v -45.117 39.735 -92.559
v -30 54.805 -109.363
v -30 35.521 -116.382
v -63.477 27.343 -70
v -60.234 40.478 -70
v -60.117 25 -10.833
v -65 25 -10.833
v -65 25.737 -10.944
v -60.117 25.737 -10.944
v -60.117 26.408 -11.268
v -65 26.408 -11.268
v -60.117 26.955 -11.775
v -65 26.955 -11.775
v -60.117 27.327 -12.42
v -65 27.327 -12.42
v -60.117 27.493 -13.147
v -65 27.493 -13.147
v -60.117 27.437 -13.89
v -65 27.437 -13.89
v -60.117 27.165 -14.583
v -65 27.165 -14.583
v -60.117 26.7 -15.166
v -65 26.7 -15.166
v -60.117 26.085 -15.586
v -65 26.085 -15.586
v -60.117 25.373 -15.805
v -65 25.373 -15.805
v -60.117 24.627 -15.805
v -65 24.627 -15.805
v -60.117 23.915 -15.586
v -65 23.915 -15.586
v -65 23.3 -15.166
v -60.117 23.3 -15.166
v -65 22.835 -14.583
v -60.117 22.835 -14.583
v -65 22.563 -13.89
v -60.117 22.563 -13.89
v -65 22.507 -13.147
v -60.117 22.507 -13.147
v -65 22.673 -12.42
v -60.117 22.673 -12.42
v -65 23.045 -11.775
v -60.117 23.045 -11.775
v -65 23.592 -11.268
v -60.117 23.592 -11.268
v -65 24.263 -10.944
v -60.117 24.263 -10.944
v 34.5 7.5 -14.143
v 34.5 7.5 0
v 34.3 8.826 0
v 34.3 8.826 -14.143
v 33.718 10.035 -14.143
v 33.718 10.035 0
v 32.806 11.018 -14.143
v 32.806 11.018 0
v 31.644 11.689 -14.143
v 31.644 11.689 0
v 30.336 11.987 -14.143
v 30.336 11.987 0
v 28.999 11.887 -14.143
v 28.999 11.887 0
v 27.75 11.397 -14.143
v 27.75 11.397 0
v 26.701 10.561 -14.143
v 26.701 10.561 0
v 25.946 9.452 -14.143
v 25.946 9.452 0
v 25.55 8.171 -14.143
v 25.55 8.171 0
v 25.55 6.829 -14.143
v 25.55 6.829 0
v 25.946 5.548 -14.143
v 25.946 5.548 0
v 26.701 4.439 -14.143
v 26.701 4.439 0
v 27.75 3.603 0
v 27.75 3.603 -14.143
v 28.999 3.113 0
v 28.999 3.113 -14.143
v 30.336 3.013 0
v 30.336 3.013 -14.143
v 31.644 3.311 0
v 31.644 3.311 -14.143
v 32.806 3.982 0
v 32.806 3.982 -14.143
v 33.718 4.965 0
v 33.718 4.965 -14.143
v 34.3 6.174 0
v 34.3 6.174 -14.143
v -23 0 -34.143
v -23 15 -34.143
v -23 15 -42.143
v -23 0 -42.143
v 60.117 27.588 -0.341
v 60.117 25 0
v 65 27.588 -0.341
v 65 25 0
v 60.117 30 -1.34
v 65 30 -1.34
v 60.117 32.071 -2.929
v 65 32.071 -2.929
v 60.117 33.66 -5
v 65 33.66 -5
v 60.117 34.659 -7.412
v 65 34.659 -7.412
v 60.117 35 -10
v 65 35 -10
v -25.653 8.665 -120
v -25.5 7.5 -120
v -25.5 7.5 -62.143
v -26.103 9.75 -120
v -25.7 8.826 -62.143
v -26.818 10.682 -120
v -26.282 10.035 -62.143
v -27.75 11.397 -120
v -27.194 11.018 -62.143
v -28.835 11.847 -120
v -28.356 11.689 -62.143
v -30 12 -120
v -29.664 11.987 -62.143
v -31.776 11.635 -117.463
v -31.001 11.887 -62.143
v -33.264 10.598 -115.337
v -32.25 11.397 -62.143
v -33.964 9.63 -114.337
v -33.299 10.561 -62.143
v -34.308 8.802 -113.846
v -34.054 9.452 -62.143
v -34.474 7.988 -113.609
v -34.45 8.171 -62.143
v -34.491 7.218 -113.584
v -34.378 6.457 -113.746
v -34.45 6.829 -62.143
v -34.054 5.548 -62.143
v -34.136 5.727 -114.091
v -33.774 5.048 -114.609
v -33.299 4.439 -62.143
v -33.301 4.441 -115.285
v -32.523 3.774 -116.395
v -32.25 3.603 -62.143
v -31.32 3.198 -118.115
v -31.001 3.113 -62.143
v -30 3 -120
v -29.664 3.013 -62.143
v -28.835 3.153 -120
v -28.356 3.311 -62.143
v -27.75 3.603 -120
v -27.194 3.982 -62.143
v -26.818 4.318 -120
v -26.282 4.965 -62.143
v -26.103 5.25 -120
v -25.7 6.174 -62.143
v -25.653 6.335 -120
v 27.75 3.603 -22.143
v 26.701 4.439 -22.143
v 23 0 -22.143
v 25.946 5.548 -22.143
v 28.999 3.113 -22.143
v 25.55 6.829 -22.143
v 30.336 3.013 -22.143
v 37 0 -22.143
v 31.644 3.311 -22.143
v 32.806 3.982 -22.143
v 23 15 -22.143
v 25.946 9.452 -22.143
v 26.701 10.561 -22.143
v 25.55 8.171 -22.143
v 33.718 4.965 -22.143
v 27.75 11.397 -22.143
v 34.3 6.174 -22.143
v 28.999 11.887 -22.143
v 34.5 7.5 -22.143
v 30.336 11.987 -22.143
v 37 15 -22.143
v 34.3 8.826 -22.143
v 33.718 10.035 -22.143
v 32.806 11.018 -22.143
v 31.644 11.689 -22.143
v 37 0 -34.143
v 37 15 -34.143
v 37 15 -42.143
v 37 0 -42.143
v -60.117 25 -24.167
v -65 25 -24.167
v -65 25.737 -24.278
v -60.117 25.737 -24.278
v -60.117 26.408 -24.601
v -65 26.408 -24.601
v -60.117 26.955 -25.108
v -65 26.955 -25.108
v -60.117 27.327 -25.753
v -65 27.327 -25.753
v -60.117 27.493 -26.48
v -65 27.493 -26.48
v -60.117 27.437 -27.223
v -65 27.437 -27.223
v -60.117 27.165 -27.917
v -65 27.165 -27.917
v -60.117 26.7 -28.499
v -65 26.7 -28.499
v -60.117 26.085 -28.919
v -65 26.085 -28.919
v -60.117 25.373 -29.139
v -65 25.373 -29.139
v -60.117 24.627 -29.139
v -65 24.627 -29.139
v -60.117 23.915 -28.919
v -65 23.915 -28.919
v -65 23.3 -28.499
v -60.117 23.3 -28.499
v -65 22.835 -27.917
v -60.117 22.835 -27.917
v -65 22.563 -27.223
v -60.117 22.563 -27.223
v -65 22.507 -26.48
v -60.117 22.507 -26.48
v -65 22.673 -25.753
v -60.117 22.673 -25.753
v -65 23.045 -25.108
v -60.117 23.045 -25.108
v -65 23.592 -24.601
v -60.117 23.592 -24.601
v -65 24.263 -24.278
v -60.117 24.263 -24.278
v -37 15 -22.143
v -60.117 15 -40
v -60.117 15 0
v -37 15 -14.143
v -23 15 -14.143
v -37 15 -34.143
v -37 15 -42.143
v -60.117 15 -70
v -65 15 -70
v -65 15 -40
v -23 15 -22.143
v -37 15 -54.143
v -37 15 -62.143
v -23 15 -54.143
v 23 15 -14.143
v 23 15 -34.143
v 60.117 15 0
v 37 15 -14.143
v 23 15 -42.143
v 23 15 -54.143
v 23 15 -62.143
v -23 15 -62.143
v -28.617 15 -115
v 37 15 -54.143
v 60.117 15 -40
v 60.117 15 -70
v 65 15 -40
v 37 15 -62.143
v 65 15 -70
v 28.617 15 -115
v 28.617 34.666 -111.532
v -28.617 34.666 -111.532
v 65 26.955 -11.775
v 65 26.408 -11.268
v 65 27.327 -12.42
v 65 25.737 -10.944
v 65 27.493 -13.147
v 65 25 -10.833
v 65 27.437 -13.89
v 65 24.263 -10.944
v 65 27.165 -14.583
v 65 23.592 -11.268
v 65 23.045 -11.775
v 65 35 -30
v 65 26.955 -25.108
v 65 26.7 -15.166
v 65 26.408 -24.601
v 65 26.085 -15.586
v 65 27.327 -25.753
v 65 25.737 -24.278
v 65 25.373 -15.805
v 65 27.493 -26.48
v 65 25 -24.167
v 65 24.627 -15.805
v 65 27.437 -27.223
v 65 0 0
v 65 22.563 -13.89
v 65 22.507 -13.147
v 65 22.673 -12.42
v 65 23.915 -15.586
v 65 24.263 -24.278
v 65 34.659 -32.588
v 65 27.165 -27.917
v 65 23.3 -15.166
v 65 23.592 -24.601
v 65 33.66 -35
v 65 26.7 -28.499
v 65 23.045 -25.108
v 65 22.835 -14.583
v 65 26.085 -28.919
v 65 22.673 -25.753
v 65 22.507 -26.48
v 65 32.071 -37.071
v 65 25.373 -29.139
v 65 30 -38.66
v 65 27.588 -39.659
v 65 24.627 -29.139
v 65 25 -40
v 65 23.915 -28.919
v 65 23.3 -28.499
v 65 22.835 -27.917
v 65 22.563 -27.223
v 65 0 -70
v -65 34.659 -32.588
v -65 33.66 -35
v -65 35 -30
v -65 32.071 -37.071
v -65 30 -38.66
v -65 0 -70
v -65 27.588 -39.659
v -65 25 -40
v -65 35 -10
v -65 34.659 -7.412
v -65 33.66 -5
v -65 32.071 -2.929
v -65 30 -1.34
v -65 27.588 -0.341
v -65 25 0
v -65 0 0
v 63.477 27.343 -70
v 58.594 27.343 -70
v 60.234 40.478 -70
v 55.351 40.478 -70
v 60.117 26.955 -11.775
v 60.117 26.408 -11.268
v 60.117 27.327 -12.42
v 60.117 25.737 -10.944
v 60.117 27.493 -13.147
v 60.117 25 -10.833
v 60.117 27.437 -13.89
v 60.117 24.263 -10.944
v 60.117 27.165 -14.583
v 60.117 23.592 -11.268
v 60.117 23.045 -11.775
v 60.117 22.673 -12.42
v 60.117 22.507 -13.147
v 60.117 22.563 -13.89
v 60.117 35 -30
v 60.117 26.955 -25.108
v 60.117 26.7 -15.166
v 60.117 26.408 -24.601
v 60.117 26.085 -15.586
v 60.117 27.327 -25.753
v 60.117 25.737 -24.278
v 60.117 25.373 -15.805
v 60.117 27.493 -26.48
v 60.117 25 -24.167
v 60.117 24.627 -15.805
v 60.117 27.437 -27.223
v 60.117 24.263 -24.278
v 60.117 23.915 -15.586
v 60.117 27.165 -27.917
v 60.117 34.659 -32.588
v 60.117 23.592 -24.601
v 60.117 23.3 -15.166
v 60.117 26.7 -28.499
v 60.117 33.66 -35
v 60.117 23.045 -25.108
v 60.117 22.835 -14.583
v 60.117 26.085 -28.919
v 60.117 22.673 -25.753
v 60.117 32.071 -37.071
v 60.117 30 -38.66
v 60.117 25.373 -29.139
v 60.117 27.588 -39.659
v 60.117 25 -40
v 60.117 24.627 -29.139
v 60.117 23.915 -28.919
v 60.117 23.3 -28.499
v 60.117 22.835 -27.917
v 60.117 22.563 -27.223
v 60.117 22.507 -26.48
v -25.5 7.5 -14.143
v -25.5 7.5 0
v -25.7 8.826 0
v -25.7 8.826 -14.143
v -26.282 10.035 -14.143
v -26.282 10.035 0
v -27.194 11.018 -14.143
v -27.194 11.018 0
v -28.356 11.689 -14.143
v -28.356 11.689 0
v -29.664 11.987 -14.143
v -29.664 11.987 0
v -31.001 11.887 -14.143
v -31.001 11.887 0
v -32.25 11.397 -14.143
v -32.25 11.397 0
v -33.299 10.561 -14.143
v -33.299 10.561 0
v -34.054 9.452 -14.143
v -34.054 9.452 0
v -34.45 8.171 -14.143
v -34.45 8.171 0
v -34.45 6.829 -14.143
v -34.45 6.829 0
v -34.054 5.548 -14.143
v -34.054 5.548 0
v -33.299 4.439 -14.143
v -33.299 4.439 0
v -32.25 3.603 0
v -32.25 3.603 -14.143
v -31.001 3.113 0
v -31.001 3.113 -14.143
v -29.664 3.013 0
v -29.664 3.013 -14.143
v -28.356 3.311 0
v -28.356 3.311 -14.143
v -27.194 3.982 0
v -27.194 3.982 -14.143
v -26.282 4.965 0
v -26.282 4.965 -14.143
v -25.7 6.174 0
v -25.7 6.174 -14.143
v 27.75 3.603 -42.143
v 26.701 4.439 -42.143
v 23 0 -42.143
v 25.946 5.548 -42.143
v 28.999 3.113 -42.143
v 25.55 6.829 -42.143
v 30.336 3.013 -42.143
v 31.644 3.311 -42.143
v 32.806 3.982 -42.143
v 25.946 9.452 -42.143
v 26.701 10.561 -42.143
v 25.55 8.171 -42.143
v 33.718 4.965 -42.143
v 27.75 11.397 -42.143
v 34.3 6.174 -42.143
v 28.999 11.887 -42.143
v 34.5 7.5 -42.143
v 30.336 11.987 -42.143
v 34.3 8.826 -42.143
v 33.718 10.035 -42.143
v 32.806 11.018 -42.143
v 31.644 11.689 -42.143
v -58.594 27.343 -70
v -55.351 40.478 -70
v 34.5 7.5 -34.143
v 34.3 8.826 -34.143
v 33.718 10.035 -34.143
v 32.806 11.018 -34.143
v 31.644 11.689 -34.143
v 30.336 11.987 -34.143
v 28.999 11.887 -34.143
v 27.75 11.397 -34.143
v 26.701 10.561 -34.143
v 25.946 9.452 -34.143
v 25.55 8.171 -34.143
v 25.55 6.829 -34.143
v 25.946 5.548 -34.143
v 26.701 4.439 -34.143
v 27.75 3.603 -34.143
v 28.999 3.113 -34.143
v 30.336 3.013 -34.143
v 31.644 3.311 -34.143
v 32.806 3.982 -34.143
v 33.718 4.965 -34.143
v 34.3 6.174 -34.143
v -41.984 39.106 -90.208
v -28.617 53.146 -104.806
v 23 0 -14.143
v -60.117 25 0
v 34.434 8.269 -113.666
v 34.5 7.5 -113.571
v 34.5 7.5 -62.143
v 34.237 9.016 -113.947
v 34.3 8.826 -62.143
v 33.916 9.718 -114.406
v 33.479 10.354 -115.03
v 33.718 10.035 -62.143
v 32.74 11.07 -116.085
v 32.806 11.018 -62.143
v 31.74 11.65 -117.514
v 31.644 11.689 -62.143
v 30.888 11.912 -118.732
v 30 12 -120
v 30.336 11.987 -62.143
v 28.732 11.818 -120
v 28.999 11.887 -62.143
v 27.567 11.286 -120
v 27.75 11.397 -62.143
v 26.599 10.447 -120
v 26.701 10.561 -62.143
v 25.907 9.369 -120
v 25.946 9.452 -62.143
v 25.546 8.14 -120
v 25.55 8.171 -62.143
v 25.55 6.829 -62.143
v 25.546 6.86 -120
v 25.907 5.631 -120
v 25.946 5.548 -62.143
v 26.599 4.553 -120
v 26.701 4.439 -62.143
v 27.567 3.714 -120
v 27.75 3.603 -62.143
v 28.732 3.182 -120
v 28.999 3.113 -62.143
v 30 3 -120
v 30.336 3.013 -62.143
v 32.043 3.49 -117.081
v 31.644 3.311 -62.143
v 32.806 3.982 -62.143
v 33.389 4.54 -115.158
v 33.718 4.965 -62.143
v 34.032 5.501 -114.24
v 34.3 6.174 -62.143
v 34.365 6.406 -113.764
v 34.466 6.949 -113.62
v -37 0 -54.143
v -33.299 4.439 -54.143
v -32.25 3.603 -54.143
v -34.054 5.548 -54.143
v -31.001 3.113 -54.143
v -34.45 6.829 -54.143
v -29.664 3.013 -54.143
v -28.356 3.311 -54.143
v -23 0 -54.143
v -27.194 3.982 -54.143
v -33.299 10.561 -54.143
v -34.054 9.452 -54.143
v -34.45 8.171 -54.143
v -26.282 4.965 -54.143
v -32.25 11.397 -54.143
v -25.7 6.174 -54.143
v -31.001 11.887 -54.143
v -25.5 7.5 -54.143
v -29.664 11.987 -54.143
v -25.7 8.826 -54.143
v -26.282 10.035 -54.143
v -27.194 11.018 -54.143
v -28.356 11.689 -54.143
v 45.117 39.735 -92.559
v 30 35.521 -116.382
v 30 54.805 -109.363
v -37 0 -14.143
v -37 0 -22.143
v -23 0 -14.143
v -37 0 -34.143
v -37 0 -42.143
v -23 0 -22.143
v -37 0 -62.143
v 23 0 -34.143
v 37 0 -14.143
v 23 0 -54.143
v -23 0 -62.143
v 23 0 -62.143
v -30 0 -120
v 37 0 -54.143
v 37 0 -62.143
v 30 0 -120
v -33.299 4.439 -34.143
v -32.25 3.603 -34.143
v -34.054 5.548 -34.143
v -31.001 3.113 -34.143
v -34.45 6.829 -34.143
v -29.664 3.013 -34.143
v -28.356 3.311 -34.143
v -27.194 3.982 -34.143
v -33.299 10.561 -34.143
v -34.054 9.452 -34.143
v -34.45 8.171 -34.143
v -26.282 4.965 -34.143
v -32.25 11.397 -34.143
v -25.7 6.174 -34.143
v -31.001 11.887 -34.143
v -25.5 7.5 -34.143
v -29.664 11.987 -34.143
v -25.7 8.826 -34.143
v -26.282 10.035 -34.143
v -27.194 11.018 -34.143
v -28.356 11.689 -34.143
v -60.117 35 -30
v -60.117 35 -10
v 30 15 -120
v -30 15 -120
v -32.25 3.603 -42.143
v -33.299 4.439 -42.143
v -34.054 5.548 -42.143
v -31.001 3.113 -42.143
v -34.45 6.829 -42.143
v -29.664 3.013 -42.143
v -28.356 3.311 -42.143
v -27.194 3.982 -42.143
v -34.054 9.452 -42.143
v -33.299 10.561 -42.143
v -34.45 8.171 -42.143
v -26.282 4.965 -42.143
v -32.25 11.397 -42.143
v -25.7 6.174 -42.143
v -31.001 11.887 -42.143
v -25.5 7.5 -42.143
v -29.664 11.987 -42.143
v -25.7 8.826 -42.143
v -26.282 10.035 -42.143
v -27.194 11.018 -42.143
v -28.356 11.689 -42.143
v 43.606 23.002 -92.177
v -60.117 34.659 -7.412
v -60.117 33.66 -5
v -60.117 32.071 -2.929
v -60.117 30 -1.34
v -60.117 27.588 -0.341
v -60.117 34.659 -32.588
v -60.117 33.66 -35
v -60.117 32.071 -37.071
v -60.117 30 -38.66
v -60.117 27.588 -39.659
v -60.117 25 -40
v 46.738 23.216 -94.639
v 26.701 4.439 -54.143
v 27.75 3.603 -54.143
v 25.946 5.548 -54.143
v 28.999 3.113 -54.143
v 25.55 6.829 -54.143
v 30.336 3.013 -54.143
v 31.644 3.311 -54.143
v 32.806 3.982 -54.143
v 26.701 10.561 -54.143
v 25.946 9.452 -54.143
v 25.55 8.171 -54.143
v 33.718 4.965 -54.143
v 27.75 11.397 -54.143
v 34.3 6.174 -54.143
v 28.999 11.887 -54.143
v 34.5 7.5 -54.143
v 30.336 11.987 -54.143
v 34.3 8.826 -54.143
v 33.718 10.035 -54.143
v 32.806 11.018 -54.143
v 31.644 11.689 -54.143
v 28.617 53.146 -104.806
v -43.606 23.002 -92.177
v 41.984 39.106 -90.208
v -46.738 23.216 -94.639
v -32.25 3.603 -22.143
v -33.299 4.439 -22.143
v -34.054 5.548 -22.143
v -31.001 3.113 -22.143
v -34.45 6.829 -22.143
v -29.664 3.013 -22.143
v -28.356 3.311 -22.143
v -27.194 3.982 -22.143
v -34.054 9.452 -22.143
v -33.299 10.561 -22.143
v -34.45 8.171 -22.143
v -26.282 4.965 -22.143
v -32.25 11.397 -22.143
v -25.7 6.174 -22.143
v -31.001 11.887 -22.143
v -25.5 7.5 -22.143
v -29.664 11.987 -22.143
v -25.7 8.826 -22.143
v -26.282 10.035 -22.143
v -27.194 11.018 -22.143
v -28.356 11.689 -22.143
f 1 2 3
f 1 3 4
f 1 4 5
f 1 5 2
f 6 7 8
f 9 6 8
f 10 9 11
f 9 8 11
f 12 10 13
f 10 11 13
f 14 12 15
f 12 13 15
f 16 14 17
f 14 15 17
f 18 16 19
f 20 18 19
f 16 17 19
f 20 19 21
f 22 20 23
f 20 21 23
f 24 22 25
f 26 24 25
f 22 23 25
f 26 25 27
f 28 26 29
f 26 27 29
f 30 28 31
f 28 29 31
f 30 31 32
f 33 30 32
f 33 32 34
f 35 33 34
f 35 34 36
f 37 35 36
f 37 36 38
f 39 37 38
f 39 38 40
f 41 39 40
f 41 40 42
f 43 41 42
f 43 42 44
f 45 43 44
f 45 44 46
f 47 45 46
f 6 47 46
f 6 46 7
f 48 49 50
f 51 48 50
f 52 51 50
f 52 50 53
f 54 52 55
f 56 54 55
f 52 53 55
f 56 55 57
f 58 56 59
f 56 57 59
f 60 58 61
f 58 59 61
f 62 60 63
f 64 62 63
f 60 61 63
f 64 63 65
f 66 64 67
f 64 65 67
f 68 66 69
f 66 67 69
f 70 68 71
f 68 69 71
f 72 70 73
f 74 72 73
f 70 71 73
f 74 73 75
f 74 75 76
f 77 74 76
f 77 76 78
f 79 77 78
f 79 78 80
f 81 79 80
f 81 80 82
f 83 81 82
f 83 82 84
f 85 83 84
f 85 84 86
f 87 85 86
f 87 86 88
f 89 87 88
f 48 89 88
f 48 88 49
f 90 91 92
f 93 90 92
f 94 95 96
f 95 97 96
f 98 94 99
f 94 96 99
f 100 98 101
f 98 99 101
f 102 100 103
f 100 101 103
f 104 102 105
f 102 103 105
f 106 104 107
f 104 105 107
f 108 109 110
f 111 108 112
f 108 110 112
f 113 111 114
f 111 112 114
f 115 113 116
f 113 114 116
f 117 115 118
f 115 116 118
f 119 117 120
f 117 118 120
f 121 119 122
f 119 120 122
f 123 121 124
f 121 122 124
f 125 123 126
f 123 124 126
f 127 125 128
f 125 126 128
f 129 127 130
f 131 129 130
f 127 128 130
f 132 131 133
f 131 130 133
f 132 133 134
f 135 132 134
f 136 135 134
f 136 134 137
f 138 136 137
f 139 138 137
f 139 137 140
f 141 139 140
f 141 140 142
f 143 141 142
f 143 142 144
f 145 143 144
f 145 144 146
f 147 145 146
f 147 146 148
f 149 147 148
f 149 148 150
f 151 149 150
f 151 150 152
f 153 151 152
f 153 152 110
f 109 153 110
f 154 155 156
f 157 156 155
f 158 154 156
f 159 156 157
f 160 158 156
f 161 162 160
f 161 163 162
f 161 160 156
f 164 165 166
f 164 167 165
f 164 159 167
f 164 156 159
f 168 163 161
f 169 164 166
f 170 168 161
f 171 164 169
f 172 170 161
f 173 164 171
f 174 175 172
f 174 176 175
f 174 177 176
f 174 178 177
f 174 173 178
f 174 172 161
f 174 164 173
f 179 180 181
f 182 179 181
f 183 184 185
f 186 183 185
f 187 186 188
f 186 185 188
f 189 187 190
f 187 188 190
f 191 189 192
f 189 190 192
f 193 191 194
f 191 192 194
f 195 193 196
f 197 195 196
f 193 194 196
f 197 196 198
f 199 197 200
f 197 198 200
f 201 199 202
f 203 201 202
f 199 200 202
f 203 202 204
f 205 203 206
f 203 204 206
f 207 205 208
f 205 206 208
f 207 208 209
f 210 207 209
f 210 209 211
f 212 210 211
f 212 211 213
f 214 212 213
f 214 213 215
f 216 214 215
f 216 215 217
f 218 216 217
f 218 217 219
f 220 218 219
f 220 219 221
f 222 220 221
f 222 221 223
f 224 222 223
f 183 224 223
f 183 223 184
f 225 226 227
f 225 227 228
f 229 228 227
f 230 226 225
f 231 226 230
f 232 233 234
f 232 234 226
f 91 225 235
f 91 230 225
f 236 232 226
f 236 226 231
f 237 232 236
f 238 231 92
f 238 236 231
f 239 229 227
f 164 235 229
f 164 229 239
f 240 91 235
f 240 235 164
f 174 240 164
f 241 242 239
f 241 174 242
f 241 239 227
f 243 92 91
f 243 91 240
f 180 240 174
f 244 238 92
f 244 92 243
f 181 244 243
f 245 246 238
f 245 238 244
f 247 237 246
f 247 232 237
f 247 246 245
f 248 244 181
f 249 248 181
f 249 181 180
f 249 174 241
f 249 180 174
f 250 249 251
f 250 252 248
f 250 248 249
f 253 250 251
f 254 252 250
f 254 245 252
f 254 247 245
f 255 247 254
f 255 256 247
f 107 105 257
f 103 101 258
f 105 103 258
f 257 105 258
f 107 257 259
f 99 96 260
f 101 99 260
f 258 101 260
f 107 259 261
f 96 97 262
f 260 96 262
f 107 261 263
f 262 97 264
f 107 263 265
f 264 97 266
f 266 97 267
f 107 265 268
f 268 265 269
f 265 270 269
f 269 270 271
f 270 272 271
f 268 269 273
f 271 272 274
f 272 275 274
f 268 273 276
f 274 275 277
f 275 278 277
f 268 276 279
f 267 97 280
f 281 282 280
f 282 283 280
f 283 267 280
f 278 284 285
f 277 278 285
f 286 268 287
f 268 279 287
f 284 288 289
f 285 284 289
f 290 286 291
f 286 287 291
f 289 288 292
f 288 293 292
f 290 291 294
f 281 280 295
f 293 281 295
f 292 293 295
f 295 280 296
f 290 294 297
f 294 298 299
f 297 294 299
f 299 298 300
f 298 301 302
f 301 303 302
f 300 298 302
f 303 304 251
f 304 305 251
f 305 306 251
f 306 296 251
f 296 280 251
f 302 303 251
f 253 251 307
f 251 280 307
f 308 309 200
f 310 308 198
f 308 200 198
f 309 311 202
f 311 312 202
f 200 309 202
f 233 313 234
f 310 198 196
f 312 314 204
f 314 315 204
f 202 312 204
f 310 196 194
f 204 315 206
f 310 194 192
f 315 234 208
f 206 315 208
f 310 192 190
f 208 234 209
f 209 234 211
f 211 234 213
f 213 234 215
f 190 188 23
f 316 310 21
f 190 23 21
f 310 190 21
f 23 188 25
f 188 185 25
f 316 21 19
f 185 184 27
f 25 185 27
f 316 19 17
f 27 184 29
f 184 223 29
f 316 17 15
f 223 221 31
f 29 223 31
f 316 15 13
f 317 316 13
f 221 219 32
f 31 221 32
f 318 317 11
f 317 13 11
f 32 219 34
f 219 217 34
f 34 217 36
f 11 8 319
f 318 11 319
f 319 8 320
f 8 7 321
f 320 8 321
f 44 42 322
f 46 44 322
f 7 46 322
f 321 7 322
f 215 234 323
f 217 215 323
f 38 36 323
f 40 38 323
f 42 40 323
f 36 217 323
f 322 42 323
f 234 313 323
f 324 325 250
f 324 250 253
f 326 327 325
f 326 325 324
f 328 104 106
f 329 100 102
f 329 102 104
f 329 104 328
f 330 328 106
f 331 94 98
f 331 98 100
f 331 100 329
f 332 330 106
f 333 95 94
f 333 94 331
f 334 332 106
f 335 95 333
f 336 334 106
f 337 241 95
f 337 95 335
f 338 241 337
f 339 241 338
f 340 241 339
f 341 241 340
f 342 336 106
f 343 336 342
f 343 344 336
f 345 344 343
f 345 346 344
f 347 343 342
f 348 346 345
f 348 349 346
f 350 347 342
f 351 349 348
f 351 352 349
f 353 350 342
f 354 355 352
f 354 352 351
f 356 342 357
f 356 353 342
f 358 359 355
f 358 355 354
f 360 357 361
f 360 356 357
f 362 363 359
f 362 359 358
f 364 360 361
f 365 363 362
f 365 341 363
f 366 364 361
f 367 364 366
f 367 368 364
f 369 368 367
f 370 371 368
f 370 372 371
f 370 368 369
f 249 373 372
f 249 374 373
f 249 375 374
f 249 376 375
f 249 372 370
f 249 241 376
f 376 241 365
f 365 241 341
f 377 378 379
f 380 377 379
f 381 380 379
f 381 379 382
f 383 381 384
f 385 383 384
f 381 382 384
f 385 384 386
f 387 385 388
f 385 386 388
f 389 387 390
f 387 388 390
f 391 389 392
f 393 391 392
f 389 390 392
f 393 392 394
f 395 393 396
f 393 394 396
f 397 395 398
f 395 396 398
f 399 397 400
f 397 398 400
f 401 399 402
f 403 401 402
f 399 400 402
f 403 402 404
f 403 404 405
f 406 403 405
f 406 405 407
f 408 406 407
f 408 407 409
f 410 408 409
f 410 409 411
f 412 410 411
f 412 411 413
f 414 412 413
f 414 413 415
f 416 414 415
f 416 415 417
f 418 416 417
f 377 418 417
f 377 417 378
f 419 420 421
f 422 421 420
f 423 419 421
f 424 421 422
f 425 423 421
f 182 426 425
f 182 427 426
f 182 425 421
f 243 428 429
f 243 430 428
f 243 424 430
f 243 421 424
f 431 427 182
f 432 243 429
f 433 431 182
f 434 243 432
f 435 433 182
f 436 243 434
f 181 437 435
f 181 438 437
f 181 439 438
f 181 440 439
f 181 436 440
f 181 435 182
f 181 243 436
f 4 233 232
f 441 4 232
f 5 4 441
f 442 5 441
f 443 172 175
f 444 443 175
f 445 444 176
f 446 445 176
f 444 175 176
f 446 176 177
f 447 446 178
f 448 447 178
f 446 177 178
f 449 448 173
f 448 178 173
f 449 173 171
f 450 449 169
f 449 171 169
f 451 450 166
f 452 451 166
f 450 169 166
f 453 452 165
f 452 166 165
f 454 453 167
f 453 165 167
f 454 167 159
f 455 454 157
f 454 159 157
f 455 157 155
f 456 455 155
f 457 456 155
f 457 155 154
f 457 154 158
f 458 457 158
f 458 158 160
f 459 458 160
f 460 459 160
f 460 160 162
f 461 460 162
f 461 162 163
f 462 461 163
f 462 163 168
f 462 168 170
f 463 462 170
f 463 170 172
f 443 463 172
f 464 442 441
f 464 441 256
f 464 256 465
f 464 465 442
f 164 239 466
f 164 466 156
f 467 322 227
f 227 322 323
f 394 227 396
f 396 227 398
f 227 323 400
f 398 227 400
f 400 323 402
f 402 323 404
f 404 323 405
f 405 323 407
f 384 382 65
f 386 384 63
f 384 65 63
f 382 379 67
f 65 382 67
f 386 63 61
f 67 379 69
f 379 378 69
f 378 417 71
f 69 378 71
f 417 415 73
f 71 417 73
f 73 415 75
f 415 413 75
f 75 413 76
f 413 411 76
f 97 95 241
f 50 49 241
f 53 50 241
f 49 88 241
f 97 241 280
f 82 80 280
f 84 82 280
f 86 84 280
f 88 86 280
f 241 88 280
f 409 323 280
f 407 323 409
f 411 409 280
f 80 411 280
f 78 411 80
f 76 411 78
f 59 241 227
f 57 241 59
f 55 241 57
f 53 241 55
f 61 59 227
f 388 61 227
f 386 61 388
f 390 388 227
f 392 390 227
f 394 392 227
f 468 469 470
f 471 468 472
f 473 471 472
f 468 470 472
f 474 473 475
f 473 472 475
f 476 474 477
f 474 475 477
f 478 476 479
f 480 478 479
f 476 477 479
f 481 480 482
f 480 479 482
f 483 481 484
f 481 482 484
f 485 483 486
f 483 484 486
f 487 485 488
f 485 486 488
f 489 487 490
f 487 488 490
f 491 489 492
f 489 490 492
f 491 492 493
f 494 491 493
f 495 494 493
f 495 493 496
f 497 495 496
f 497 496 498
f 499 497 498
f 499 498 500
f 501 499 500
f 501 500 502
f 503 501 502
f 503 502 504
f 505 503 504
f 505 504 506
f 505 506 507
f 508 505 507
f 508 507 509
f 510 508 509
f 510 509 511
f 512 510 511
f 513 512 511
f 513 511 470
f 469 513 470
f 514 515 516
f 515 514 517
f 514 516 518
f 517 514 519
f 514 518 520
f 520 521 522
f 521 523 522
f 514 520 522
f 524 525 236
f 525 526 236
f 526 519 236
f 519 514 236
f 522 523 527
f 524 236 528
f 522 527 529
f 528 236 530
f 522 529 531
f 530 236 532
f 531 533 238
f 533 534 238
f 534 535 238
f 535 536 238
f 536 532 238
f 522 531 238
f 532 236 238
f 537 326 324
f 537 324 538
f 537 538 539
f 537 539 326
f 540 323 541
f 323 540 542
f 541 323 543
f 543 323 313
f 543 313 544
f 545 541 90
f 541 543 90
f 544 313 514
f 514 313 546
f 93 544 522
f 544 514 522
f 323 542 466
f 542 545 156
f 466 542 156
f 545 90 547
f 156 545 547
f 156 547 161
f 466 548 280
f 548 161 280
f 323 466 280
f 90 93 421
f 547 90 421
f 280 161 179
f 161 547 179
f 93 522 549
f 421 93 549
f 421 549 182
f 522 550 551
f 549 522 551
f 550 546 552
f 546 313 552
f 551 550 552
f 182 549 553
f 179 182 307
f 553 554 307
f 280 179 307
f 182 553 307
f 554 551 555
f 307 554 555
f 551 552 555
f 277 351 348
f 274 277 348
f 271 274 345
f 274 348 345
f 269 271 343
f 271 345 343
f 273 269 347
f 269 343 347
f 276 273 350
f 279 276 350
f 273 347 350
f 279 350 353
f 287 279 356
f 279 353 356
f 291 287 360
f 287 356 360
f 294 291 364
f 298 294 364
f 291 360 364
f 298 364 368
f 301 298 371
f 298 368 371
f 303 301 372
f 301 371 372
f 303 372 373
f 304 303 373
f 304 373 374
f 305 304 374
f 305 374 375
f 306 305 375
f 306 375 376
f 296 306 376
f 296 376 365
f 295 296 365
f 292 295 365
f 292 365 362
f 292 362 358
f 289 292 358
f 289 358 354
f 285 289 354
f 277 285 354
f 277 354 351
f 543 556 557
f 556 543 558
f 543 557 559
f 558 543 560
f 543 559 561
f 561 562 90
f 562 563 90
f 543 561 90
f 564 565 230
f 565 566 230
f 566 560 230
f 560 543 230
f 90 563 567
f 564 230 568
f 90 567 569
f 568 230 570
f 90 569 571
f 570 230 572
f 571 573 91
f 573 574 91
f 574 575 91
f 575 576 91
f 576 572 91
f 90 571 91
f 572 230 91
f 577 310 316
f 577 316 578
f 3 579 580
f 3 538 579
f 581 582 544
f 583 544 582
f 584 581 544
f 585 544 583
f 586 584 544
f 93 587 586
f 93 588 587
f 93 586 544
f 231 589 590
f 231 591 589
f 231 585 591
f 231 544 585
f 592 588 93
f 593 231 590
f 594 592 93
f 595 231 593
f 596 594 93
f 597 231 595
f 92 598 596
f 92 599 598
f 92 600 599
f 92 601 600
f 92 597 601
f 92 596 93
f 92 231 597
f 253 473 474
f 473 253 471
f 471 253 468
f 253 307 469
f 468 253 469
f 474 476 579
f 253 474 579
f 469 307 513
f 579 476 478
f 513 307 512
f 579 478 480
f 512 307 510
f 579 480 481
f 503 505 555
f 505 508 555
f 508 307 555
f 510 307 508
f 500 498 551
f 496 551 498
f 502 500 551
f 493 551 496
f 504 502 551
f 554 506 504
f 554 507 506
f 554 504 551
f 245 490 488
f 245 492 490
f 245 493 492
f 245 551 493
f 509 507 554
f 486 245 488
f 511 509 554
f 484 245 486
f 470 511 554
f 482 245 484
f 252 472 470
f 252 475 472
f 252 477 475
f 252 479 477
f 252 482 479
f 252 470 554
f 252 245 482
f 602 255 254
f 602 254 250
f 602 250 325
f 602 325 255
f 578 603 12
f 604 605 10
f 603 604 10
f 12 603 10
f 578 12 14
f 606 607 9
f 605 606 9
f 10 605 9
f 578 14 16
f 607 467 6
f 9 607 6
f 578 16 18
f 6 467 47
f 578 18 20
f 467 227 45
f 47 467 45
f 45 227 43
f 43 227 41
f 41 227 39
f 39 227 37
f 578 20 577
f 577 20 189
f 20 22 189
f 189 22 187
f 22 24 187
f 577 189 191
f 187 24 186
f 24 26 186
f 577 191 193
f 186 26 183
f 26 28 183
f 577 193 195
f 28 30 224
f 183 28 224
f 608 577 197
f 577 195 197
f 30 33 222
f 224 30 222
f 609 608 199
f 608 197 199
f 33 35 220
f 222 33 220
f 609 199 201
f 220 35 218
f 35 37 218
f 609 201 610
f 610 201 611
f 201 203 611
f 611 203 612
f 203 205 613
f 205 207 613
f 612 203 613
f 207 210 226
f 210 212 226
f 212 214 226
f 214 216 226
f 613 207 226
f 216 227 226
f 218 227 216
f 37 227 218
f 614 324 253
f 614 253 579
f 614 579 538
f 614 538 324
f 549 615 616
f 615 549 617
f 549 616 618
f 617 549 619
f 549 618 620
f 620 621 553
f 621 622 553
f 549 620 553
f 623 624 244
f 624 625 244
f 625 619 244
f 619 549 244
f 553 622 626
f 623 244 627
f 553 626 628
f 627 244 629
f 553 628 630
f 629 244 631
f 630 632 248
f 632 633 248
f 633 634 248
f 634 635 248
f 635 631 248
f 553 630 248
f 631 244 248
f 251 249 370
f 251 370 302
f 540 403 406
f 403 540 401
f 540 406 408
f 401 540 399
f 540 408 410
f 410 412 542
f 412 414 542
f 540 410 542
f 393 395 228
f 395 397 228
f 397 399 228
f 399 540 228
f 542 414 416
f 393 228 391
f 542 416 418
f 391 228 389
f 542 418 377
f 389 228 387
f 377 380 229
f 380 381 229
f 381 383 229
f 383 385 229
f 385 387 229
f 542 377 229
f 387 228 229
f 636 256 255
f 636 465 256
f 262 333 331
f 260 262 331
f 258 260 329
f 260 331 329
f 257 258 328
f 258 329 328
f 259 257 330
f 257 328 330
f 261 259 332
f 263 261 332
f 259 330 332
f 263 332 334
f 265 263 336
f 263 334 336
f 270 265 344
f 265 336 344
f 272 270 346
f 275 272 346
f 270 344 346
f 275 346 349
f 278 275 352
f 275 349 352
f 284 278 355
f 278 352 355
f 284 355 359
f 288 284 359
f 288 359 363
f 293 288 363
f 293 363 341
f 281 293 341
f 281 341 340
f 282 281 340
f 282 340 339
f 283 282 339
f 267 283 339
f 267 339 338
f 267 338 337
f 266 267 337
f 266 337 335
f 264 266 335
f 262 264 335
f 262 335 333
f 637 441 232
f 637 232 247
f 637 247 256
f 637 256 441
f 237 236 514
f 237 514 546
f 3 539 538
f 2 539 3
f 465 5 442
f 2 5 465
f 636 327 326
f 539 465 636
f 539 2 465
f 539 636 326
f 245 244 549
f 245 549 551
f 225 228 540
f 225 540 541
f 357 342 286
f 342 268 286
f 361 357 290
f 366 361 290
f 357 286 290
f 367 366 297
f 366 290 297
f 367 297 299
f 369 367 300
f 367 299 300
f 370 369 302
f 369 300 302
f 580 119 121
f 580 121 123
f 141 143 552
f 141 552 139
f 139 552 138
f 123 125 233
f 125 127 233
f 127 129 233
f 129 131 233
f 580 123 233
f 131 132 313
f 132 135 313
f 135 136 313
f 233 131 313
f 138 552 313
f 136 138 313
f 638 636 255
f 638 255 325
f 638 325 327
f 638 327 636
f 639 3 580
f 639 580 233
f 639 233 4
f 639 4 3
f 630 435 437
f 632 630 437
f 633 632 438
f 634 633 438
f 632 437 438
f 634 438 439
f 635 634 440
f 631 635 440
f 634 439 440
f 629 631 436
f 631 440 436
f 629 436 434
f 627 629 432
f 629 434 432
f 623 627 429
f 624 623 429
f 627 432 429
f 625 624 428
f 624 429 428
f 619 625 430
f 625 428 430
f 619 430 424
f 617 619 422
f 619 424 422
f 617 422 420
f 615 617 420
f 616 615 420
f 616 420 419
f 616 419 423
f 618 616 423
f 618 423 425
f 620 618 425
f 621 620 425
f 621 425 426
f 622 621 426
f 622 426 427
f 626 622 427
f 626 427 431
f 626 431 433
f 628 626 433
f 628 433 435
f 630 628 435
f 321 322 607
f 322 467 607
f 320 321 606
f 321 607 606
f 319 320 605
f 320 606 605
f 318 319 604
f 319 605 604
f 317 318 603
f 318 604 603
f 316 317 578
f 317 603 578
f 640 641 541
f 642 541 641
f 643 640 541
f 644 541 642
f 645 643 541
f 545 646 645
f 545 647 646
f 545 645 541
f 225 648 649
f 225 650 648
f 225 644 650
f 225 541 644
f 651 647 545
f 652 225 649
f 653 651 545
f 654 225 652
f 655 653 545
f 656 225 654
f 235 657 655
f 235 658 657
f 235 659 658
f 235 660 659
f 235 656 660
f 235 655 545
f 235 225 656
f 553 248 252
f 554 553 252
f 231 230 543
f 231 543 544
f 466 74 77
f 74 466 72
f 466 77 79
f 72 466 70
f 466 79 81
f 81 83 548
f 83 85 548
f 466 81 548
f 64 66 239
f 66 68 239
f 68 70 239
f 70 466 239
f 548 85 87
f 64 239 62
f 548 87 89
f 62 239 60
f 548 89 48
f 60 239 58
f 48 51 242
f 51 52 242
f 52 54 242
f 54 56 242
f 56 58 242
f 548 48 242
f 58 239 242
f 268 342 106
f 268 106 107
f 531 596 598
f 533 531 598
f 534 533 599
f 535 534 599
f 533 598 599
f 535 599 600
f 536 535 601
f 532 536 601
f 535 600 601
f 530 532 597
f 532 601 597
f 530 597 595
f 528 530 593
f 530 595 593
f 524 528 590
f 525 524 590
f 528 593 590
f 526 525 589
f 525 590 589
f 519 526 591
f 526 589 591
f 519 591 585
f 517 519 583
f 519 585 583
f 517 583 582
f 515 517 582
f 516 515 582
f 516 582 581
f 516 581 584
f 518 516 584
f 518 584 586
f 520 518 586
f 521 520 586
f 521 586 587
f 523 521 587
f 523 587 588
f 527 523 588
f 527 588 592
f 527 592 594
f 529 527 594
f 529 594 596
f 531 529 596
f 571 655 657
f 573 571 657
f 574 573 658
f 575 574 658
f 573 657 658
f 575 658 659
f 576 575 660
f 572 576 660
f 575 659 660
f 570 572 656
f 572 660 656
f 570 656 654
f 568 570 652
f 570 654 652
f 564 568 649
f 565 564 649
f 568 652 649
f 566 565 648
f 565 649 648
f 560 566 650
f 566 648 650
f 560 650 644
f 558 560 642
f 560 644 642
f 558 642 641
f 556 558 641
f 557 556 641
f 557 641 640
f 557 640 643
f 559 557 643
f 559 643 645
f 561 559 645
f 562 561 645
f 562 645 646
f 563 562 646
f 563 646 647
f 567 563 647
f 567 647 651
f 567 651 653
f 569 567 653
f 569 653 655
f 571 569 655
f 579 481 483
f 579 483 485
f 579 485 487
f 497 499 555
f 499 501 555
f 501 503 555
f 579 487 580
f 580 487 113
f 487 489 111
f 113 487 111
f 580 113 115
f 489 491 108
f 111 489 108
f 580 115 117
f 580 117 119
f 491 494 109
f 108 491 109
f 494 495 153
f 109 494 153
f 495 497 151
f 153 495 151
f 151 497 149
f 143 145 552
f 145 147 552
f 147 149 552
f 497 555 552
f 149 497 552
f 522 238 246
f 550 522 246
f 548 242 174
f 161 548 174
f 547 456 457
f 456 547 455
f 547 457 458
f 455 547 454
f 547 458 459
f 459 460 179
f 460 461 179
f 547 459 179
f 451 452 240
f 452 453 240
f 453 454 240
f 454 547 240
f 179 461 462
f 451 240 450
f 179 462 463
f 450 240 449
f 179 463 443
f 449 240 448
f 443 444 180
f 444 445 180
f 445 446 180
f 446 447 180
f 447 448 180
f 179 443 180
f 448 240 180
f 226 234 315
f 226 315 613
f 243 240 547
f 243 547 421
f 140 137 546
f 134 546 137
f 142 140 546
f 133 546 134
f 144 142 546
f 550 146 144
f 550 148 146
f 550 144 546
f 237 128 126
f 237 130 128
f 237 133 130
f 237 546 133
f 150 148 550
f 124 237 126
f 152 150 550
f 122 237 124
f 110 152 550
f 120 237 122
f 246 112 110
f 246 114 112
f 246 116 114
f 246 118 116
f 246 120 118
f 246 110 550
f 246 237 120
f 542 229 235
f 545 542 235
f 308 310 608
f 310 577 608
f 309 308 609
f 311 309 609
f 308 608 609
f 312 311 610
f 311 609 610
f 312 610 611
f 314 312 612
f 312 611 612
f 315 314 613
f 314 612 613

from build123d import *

# Parameters (mm, degrees)
EXTRUDE_1_DEPTH        = 15
SKETCH_4_W             = 130
SKETCH_4_H             = 53.153449772
CUT_EXTRUDE_1_DEPTH    = 70
SKETCH_5_W             = 4.882622246
SKETCH_5_H             = 40
EXTRUDE_2_DEPTH        = 20
SKETCH_6_R             = 2.5
CUT_EXTRUDE_2_DEPTH    = 186.212230178
FILLET_1_R             = 10
SKETCH_7_R             = 4.5
CUT_EXTRUDE_3_DEPTH    = 148.066550223
SKETCH_8_W             = 14
SKETCH_8_H             = 8
CUT_EXTRUDE_4_DEPTH    = 143.159857501
PATTERN_LINEAR_1_COUNT = 3
PATTERN_LINEAR_1_PITCH = 20


with BuildPart() as part:
    # 草图1 → 凸台-拉伸1 (new body)
    with BuildSketch(Plane(origin=(0, 0, 0), x_dir=(1, 0, 0), z_dir=(0, 1, 0))):
        Polygon((-65, 0), (65, 0), (65, 70), (30, 120), (-30, 120), (-65, 70), align=None)
    extrude(amount=EXTRUDE_1_DEPTH)

    # 草图2 → 放样1 section 0
    with BuildSketch(Plane(origin=(0, 15, 0), x_dir=(1, 0, 0), z_dir=(0, 1, 0))):
        with BuildLine():
            Line((-65, 70), (-61.723072318, 67.706150623))
            Line((-61.723072318, 67.706150623), (-28.617377754, 115))
            Line((-28.617377754, 115), (28.617377754, 115))
            Line((28.617377754, 115), (61.723072318, 67.706150623))
            Line((61.723072318, 67.706150623), (65, 70))
            Line((65, 70), (30, 120))
            Line((30, 120), (-30, 120))
            Line((-30, 120), (-65, 70))
        make_face()
    # 草图3 → 放样1 section 1
    with BuildSketch(Plane(origin=(0, 14.547694656, 2.565151075), x_dir=(1, 0, 0), z_dir=(0, 0.984807753012208, 0.17364817766693072))):
        with BuildLine():
            Line((-65, 71.541265376), (-61.723072318, 69.282264725))
            Line((-61.723072318, 69.282264725), (-28.617377754, 115.857614261))
            Line((-28.617377754, 115.857614261), (28.617377754, 115.857614261))
            Line((28.617377754, 115.857614261), (61.723072318, 69.282264725))
            Line((61.723072318, 69.282264725), (65, 71.541265376))
            Line((65, 71.541265376), (30, 120.781653026))
            Line((30, 120.781653026), (-30, 120.781653026))
            Line((-30, 120.781653026), (-65, 71.541265376))
        make_face()
    loft()

    # 草图9 → 放样2 section 0
    with BuildSketch(Plane(origin=(0, 14.547694656, 2.565151075), x_dir=(1, 0, 0), z_dir=(0, 0.9848077530122079, 0.17364817766693139))):
        with BuildLine():
            Line((-65, 71.541265376), (-61.723072318, 69.282264725))
            Line((-61.723072318, 69.282264725), (-28.617377754, 115.857614261))
            Line((-28.617377754, 115.857614261), (28.617377754, 115.857614261))
            Line((28.617377754, 115.857614261), (61.723072318, 69.282264725))
            Line((61.723072318, 69.282264725), (65, 71.541265376))
            Line((65, 71.541265376), (30, 120.781653026))
            Line((30, 120.781653026), (-30, 120.781653026))
            Line((-30, 120.781653026), (-65, 71.541265376))
        make_face()
    # 草图10 → 放样2 section 1
    with BuildSketch(Plane(origin=(0, 13.245333323, 4.820907073), x_dir=(1, 0, 0), z_dir=(0, 0.9396926207859081, 0.34202014332566943))):
        with BuildLine():
            Line((-65, 73.019543877), (-61.723072318, 70.794862522))
            Line((-61.723072318, 70.794862522), (-28.617377754, 116.662627845))
            Line((-28.617377754, 116.662627845), (28.617377754, 116.662627845))
            Line((28.617377754, 116.662627845), (61.723072318, 70.794862522))
            Line((61.723072318, 70.794862522), (65, 73.019543877))
            Line((65, 73.019543877), (30, 121.511859397))
            Line((30, 121.511859397), (-30, 121.511859397))
            Line((-30, 121.511859397), (-65, 73.019543877))
        make_face()
    loft()

    # 草图4 → 切除-拉伸1 (cut)
    with BuildSketch(Plane.XY):
        with Locations((0, 41.576724886)):
            Rectangle(SKETCH_4_W, SKETCH_4_H)
    extrude(amount=-CUT_EXTRUDE_1_DEPTH, mode=Mode.SUBTRACT)

    # 草图5 → 凸台-拉伸2 (add)
    with BuildSketch(Plane(origin=(0, 15, 0), x_dir=(1, 0, 0), z_dir=(0, 1, 0))):
        with Locations((62.558688877, 20)):
            Rectangle(SKETCH_5_W, SKETCH_5_H)
        with Locations((-62.558688877, 20)):
            Rectangle(SKETCH_5_W, SKETCH_5_H)
    extrude(amount=EXTRUDE_2_DEPTH)

    # 草图6 → 切除-拉伸2 (cut, through all)
    with BuildSketch(Plane.ZY.offset(65)):
        with Locations((-26.666666667, 25)):
            Circle(SKETCH_6_R)
        with Locations((-13.333333333, 25)):
            Circle(SKETCH_6_R)
    extrude(amount=-CUT_EXTRUDE_2_DEPTH, mode=Mode.SUBTRACT)

    # 圆角1
    fillet_1_edges = [part.edges().sort_by_distance(p)[0] for p in [
        (62.558688877, 35, 0),
        (62.558688877, 35, -40),
        (-62.558688877, 35, 0),
        (-62.558688877, 35, -40),
    ]]
    fillet(fillet_1_edges, radius=FILLET_1_R)

    # 草图7 → 切除-拉伸3 (cut, through all)
    with BuildSketch(Plane.XY):
        with Locations((-30, 7.5)):
            Circle(SKETCH_7_R)
        with Locations((30, 7.5)):
            Circle(SKETCH_7_R)
    extrude(amount=-CUT_EXTRUDE_3_DEPTH, mode=Mode.SUBTRACT)

    # 草图8 → 切除-拉伸4 (cut, through all)
    with BuildSketch(Plane(origin=(0, 15, 0), x_dir=(1, 0, 0), z_dir=(0, 1, 0))):
        with Locations((-30, 58.142993984)):
            Rectangle(SKETCH_8_W, SKETCH_8_H)
        with Locations((30, 58.142993984)):
            Rectangle(SKETCH_8_W, SKETCH_8_H)
    cut_extrude_4 = extrude(amount=-CUT_EXTRUDE_4_DEPTH, mode=Mode.SUBTRACT)

    # 阵列(线性)1: 切除-拉伸4 ×3
    with Locations(*[(0, 0, i * PATTERN_LINEAR_1_PITCH) for i in range(1, PATTERN_LINEAR_1_COUNT)]):
        add(cut_extrude_4, mode=Mode.SUBTRACT)


solid = part.part
